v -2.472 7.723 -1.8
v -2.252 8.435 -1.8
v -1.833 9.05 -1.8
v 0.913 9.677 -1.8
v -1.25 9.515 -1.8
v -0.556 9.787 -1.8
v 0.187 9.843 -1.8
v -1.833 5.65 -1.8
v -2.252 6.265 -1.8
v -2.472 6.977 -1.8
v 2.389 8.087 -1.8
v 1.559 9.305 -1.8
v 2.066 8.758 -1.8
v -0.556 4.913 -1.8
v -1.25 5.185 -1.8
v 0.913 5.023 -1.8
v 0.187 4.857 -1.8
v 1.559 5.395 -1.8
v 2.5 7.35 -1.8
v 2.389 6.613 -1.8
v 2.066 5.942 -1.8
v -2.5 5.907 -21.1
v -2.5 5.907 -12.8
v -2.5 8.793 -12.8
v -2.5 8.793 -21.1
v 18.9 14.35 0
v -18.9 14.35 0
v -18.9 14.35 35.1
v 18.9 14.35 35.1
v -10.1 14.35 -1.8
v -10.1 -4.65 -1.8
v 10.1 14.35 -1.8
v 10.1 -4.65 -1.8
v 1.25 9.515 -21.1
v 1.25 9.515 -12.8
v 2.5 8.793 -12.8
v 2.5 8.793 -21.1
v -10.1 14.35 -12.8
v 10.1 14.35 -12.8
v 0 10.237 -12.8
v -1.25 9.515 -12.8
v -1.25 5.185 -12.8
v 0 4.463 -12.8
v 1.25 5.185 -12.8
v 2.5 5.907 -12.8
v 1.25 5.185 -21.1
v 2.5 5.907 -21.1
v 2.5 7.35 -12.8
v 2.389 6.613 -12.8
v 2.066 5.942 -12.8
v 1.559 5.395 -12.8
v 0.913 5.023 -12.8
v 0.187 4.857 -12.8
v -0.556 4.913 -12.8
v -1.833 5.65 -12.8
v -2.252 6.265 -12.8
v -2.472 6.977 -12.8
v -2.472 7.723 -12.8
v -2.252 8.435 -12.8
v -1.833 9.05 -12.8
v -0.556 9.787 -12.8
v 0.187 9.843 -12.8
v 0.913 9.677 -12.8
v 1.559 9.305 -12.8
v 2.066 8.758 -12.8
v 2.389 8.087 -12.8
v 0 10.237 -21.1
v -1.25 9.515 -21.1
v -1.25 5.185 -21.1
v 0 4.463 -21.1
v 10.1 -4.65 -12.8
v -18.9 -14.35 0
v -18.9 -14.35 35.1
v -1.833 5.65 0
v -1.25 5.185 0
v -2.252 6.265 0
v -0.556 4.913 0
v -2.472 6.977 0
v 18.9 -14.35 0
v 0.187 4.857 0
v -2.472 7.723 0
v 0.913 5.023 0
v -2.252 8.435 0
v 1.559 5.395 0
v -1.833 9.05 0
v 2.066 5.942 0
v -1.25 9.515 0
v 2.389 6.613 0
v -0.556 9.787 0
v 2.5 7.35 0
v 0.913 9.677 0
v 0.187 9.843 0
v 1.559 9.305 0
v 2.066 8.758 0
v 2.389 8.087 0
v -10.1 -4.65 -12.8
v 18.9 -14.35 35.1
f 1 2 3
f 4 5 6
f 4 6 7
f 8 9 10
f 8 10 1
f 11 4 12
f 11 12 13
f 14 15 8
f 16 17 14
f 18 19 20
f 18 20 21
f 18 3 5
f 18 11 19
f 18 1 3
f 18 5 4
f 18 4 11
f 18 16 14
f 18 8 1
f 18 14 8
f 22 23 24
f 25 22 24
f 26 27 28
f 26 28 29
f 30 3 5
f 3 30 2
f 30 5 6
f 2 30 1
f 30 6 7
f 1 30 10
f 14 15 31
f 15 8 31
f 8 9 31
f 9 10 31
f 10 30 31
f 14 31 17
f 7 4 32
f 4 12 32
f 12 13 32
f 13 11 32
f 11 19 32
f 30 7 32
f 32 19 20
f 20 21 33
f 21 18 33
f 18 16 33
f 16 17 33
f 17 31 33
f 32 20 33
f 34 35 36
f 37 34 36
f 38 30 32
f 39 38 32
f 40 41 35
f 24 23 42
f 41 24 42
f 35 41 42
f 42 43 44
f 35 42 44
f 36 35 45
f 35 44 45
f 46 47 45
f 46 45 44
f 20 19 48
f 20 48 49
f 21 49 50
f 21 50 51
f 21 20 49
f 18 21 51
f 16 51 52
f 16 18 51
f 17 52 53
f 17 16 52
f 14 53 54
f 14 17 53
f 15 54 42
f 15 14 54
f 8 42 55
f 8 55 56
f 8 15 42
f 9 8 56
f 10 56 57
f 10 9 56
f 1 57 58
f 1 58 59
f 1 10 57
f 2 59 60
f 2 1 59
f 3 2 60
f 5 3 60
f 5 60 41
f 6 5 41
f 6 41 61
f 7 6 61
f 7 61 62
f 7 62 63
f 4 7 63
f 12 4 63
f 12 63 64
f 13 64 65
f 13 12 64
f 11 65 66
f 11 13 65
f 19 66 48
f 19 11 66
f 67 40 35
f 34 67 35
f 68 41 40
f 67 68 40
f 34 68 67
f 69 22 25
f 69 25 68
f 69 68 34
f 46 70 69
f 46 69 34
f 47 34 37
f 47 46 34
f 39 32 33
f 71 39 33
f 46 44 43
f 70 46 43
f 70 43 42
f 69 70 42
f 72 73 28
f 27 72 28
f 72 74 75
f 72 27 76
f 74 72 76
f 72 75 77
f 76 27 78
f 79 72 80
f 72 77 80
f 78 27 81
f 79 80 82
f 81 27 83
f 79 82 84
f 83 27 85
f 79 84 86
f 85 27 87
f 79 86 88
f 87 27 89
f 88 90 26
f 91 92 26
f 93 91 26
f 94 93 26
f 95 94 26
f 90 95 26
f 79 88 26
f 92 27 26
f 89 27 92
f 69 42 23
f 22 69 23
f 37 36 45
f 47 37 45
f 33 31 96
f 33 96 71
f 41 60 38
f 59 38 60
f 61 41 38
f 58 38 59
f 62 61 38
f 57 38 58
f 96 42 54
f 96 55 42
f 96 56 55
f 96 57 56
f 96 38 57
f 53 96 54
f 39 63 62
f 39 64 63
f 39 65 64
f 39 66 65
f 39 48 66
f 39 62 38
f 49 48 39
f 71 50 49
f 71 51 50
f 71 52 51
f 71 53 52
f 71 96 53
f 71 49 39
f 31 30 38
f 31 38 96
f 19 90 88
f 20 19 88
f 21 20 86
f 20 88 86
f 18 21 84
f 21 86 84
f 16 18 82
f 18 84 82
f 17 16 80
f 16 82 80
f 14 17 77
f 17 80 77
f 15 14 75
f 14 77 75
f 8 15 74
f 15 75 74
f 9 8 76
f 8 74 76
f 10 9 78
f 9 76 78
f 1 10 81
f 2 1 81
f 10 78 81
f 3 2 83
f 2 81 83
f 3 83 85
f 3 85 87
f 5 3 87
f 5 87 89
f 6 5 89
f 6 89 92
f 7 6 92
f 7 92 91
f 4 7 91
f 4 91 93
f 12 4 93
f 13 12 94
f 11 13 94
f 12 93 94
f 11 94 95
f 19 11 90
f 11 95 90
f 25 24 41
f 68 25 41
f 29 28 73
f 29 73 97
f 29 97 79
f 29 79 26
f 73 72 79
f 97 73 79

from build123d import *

# Parameters (mm, degrees)
F0_W     = 37.8
F0_H     = 28.7
F1_DEPTH = 35.1
F2_R     = 2.5
F3_DEPTH = 1.8
F4_W     = 20.2
F4_H     = 19
F4_R     = 2.5
F5_DEPTH = 11
F7_DEPTH = 8.3


with BuildPart() as f1:
    # F0 (on Top) → F1 (new body)
    with BuildSketch(Plane.XY):
        Rectangle(F0_W, F0_H)
    extrude(amount=F1_DEPTH)

    # F2 (on face) → F3 (join)
    with BuildSketch(Plane(origin=(0, 0, 0), x_dir=(1, 0, 0), z_dir=(0, 0, -1))):
        with Locations((0, -7.35)):
            Circle(F2_R)
    extrude(amount=F3_DEPTH)


with BuildPart() as f5:
    # F4 (on face) → F5 (new body)
    with BuildSketch(Plane(origin=(0, 0, -1.8), x_dir=(1, 0, 0), z_dir=(0, 0, -1))):
        with Locations((0, -4.85)):
            Rectangle(F4_W, F4_H)
        with Locations((0, -7.35)):
            Circle(F4_R, mode=Mode.SUBTRACT)
    extrude(amount=F5_DEPTH)


with BuildPart() as f7:
    # F6 (on face) → F7 (new body)
    with BuildSketch(Plane(origin=(0, 0, -12.8), x_dir=(1, 0, 0), z_dir=(0, 0, -1))):
        with BuildLine():
            Line((0, -10.2367513459), (1.2500000382, -9.5150634874))
            ThreePointArc((1.2500000382, -9.5150634874), (6e-09, -9.85), (-1.2500000279, -9.5150634934))
            Line((-1.2500000279, -9.5150634934), (0, -10.2367513459))
        make_face()
        with BuildLine():
            Line((2.5, -8.793375673), (2.5, -7.35))
            ThreePointArc((2.5, -7.35), (2.1650635205, -8.5999999809), (1.2500000382, -9.5150634874))
            Line((1.2500000382, -9.5150634874), (2.5, -8.793375673))
        make_face()
        with BuildLine():
            Line((-2.5, -8.793375673), (-1.2500000279, -9.5150634934))
            ThreePointArc((-1.2500000279, -9.5150634934), (-2.1650635175, -8.5999999861), (-2.5, -7.35))
            Line((-2.5, -7.35), (-2.5, -8.793375673))
        make_face()
        with BuildLine():
            ThreePointArc((1.2500000021, -5.1849364918), (2.1650635101, -6.1000000011), (2.5, -7.35))
            Line((2.5, -7.35), (2.5, -5.906624327))
            Line((2.5, -5.906624327), (1.2500000021, -5.1849364918))
        make_face()
        with BuildLine():
            ThreePointArc((-2.5, -7.35), (-2.1650635361, -6.1000000462), (-1.2500000924, -5.1849365439))
            Line((-1.2500000924, -5.1849365439), (-2.5, -5.906624327))
            Line((-2.5, -5.906624327), (-2.5, -7.35))
        make_face()
        with BuildLine():
            ThreePointArc((1.2500000382, -9.5150634874), (2.1650635205, -8.5999999809), (2.5, -7.35))
            ThreePointArc((2.5, -7.35), (2.1650635101, -6.1000000011), (1.2500000021, -5.1849364918))
            ThreePointArc((1.2500000021, -5.1849364918), (-5.21e-08, -4.85), (-1.2500000924, -5.1849365439))
            ThreePointArc((-1.2500000924, -5.1849365439), (-2.1650635361, -6.1000000462), (-2.5, -7.35))
            ThreePointArc((-2.5, -7.35), (-2.1650635175, -8.5999999861), (-1.2500000279, -9.5150634934))
            ThreePointArc((-1.2500000279, -9.5150634934), (6e-09, -9.85), (1.2500000382, -9.5150634874))
        make_face()
        with BuildLine():
            ThreePointArc((-1.2500000924, -5.1849365439), (-5.21e-08, -4.85), (1.2500000021, -5.1849364918))
            Line((1.2500000021, -5.1849364918), (0, -4.4632486541))
            Line((0, -4.4632486541), (-1.2500000924, -5.1849365439))
        make_face()
    extrude(amount=F7_DEPTH)


solid = Compound([f1.part, f5.part, f7.part])
